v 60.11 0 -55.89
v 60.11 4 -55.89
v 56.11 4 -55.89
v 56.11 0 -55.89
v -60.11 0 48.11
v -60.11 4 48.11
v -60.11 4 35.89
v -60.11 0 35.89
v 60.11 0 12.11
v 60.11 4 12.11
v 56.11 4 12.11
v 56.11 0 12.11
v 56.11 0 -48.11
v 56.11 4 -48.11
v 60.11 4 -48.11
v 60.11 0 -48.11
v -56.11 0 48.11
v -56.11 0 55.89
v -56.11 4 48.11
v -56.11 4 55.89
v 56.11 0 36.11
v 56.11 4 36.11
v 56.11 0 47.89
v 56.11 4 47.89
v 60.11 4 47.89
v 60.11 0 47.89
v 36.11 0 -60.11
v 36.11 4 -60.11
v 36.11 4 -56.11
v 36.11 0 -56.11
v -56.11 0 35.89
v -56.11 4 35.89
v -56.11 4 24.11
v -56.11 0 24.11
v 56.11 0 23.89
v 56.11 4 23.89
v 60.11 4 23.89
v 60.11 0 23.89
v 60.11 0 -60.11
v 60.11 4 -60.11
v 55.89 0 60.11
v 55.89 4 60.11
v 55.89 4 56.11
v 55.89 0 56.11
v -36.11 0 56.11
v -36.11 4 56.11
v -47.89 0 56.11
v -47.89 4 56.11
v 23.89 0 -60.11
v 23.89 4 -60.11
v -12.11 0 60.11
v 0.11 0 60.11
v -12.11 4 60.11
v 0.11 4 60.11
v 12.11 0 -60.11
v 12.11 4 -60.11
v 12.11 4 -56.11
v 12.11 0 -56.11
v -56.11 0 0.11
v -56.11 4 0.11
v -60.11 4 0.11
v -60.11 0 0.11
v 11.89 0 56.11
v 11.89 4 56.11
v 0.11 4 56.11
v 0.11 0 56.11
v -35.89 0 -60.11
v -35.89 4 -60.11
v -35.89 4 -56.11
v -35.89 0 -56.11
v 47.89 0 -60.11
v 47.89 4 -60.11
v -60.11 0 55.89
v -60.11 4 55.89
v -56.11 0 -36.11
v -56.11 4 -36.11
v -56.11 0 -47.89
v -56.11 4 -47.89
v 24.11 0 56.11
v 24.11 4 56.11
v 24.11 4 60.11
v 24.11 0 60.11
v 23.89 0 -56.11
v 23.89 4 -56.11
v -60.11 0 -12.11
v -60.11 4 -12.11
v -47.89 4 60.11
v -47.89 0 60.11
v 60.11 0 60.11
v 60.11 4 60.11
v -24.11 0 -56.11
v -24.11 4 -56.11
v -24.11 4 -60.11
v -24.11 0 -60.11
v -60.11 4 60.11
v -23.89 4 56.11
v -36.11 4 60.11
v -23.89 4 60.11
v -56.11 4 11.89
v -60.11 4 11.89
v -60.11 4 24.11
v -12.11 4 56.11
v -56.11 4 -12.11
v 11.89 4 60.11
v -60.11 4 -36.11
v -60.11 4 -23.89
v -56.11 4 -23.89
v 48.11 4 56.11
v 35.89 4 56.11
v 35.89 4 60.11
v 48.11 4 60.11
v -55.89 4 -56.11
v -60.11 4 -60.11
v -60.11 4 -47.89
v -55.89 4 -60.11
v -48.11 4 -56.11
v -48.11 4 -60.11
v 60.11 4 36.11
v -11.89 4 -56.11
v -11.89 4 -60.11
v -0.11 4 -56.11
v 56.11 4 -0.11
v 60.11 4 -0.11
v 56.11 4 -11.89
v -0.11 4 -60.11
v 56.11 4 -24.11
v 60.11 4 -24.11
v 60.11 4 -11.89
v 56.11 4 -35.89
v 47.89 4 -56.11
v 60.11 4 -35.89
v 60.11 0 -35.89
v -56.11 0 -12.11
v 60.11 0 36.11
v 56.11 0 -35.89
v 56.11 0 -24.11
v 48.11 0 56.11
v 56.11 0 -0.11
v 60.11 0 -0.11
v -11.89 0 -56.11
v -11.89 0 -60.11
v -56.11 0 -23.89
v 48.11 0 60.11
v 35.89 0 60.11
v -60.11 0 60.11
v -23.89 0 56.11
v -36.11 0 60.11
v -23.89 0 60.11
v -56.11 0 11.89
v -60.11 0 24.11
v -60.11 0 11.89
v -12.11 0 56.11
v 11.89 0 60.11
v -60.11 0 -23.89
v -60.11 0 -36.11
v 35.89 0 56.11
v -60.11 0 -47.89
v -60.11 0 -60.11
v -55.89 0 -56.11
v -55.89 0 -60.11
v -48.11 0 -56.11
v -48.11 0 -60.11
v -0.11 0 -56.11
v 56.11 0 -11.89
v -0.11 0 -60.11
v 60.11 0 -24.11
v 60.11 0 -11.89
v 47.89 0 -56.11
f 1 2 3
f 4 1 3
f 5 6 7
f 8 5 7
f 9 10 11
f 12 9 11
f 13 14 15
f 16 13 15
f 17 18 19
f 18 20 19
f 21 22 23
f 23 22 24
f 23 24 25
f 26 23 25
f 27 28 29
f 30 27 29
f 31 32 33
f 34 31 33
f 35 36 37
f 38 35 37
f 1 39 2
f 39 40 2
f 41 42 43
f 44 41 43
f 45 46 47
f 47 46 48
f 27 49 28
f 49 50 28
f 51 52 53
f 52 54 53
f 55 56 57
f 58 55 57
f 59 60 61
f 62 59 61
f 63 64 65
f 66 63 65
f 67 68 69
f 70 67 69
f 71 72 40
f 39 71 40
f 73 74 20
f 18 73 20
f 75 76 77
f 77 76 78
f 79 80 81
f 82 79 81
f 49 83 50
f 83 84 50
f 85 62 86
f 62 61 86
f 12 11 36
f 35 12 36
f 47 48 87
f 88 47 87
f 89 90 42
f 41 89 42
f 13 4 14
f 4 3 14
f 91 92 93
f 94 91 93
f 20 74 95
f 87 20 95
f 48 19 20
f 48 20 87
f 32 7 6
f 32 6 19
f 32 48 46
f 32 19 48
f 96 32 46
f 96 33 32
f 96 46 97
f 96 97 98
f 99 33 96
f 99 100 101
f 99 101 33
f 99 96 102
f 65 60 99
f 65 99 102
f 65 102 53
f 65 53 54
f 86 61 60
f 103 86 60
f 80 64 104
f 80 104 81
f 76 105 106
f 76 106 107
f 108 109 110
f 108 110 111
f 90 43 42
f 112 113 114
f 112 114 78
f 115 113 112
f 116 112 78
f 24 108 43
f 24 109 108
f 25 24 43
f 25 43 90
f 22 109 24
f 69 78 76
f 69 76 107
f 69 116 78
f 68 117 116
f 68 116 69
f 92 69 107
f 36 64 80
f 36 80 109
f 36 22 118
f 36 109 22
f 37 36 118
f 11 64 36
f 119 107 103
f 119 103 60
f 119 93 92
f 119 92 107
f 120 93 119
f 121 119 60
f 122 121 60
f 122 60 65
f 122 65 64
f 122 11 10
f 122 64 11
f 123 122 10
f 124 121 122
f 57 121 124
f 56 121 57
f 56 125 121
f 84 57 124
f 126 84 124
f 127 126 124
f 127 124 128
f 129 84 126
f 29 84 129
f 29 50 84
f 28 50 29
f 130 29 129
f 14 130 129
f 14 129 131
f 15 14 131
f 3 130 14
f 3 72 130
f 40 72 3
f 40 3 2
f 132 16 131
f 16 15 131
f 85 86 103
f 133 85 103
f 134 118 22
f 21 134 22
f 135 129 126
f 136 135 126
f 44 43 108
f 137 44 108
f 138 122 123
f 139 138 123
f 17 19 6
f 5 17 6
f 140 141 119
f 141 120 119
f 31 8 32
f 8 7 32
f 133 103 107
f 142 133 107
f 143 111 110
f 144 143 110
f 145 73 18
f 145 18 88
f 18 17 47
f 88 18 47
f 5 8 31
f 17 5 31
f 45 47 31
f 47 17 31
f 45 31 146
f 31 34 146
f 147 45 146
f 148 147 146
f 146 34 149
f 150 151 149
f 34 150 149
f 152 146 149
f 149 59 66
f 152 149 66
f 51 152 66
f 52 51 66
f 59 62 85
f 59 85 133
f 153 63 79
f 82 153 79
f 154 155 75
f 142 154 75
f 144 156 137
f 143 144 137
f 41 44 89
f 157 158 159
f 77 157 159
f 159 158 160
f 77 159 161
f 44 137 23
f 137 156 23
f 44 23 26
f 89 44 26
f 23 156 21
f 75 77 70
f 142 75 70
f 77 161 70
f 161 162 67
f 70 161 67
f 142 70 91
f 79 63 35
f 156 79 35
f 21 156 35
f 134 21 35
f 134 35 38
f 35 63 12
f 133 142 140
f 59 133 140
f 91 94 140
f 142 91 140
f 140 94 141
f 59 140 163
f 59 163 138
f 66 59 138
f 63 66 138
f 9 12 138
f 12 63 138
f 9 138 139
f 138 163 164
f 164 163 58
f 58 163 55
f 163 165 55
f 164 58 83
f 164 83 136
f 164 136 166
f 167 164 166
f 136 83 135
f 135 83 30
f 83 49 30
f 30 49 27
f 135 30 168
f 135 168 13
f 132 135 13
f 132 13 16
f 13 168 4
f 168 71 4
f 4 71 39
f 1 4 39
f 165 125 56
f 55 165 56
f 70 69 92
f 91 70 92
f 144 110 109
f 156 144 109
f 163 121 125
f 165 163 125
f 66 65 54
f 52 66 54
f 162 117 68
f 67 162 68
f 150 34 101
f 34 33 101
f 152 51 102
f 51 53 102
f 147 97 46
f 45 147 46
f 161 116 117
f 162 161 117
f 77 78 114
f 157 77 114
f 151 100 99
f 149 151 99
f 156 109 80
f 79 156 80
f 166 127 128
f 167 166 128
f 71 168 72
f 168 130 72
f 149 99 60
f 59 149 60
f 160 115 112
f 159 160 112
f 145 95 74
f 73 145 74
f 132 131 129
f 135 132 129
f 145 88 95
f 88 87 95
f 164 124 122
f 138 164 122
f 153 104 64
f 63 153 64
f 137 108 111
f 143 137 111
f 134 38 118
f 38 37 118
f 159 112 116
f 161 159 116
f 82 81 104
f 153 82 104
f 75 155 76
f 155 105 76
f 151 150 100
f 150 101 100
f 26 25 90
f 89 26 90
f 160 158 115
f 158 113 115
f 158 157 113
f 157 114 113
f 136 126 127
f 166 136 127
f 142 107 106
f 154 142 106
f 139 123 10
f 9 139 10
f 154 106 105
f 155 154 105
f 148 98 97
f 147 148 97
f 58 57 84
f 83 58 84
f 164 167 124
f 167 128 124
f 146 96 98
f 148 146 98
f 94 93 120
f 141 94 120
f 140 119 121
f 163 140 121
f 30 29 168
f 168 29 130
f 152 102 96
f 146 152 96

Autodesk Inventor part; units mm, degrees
ref_plane "YZ Plane" through (0, 0, 0) normal (1, 0, 0) x (0, 1, 0)
ref_plane "XZ Plane" through (0, 0, 0) normal (0, 1, 0) x (-1, 0, 0)
ref_plane "XY Plane" through (0, 0, 0) normal (0, 0, 1) x (1, 0, 0)
sketch "Sketch1" plane through (0, 0, 0) normal (0, 1, 0) x (-1, 0, 0)
  line L0 (60, 60) -> (-60, 60)
  line L1 (-60, 60) -> (-60, -60)
  line L2 (-60, -60) -> (60, -60)
  line L3 (60, -60) -> (60, 60)
  point P0 (0, 0)
  dimension "d2" = 120
  dimension "d3" = 120
  dimension "d4" = 60
  dimension "d5" = 60
extrude "Extrusion1" add sketch "Sketch1" along normal blind 4
sketch "Sketch2" plane through (-60, 0, -60) normal (-1, 0, 0) x (0, 0, 1)
  line L0 (12, 0) -> (24, 0)
  line L1 (24, 0) -> (24, 4)
  line L2 (24, 4) -> (12, 4)
  line L3 (12, 4) -> (12, 0)
  line L4 (0, 4) -> (120, 4) projected
  line L5 (0, 0) -> (0, 4) projected
  point P0 (60, 0)
  dimension "d8" = 12
  dimension "d9" = 4
  dimension "d10" = 0
  dimension "d11" = 12
extrude "Extrusion2" cut sketch "Sketch2" against normal blind 4
pattern_linear "Rectangular Pattern1" count 5 spacing 24 along (0, 0, 1) of "Extrusion2"
sketch "Sketch3" plane through (-56, 0, 60) normal (-1, 0, 0) x (0, 0, 1)
  line L0 (0, 0) -> (-4, 0)
  line L1 (-4, 0) -> (-4, 4)
  line L2 (-4, 4) -> (0, 4)
  line L3 (0, 4) -> (0, 0)
  line L4 (0, 0) -> (0, 4) projected
  line L5 (0, 4) -> (-120, 4) projected
  point P0 (-60, 0)
  dimension "d23" = 4
  dimension "d24" = 4
  dimension "d25" = 0
  dimension "d26" = 0
extrude "Extrusion3" add sketch "Sketch3" along normal blind 4
pattern_circular "Circular Pattern3" count 4 over 360 about axis through (0, -10, 0) along (0, 1, 0) of "Extrusion3", "Extrusion2", "Rectangular Pattern1"
sketch "Sketch4" plane through (0, 4, 0) normal (0, 1, 0) x (1, 0, 0)
  line L0 (-48, 56) -> (-56, 56) projected
  line L1 (-56, 56) -> (-56, 60) projected
  line L2 (-60, 60) -> (-56, 60) projected
  line L3 (-60, 60) -> (-60, 48) projected
  line L4 (-60, 48) -> (-56, 48) projected
  line L5 (-56, 48) -> (-56, 36) projected
  line L6 (-56, 36) -> (-60, 36) projected
  line L7 (-60, 36) -> (-60, 24) projected
  line L8 (-60, 24) -> (-56, 24) projected
  line L9 (-56, 24) -> (-56, 12) projected
  line L10 (-56, 12) -> (-60, 12) projected
  line L11 (-60, 12) -> (-60, 0) projected
  line L12 (-60, 0) -> (-56, 0) projected
  line L13 (-56, 0) -> (-56, -12) projected
  line L14 (-56, -12) -> (-60, -12) projected
  line L15 (-60, -12) -> (-60, -24) projected
  line L16 (-60, -24) -> (-56, -24) projected
  line L17 (-56, -24) -> (-56, -36) projected
  line L18 (-56, -36) -> (-60, -36) projected
  line L19 (-60, -36) -> (-60, -48) projected
  line L20 (-60, -48) -> (-56, -48) projected
  line L21 (-56, -48) -> (-56, -56) projected
  line L22 (-56, -56) -> (-60, -56) projected
  line L23 (-60, -60) -> (-60, -56) projected
  line L24 (-60, -60) -> (-48, -60) projected
  line L25 (-48, -60) -> (-48, -56) projected
  line L26 (-48, -56) -> (-36, -56) projected
  line L27 (-36, -56) -> (-36, -60) projected
  line L28 (-36, -60) -> (-24, -60) projected
  line L29 (-24, -60) -> (-24, -56) projected
  line L30 (-24, -56) -> (-12, -56) projected
  line L31 (-12, -56) -> (-12, -60) projected
  line L32 (-12, -60) -> (0, -60) projected
  line L33 (0, -60) -> (0, -56) projected
  line L34 (0, -56) -> (12, -56) projected
  line L35 (12, -56) -> (12, -60) projected
  line L36 (12, -60) -> (24, -60) projected
  line L37 (24, -60) -> (24, -56) projected
  line L38 (24, -56) -> (36, -56) projected
  line L39 (36, -56) -> (36, -60) projected
  line L40 (36, -60) -> (48, -60) projected
  line L41 (48, -60) -> (48, -56) projected
  line L42 (48, -56) -> (56, -56) projected
  line L43 (56, -56) -> (56, -60) projected
  line L44 (60, -60) -> (56, -60) projected
  line L45 (60, -60) -> (60, -48) projected
  line L46 (60, -48) -> (56, -48) projected
  line L47 (56, -48) -> (56, -36) projected
  line L48 (56, -36) -> (60, -36) projected
  line L49 (60, -36) -> (60, -24) projected
  line L50 (60, -24) -> (56, -24) projected
  line L51 (56, -24) -> (56, -12) projected
  line L52 (56, -12) -> (60, -12) projected
  line L53 (60, -12) -> (60, 0) projected
  line L54 (60, 0) -> (56, 0) projected
  line L55 (56, 0) -> (56, 12) projected
  line L56 (56, 12) -> (60, 12) projected
  line L57 (60, 12) -> (60, 24) projected
  line L58 (60, 24) -> (56, 24) projected
  line L59 (56, 24) -> (56, 36) projected
  line L60 (56, 36) -> (60, 36) projected
  line L61 (60, 36) -> (60, 48) projected
  line L62 (60, 48) -> (56, 48) projected
  line L63 (56, 48) -> (56, 56) projected
  line L64 (56, 56) -> (60, 56) projected
  line L65 (60, 60) -> (60, 56) projected
  line L66 (60, 60) -> (48, 60) projected
  line L67 (48, 60) -> (48, 56) projected
  line L68 (48, 56) -> (36, 56) projected
  line L69 (36, 56) -> (36, 60) projected
  line L70 (36, 60) -> (24, 60) projected
  line L71 (24, 60) -> (24, 56) projected
  line L72 (24, 56) -> (12, 56) projected
  line L73 (12, 56) -> (12, 60) projected
  line L74 (12, 60) -> (0, 60) projected
  line L75 (0, 60) -> (0, 56) projected
  line L76 (0, 56) -> (-12, 56) projected
  line L77 (-12, 56) -> (-12, 60) projected
  line L78 (-12, 60) -> (-24, 60) projected
  line L79 (-24, 60) -> (-24, 56) projected
  line L80 (-24, 56) -> (-36, 56) projected
  line L81 (-36, 56) -> (-36, 60) projected
  line L82 (-36, 60) -> (-48, 60) projected
  line L83 (-48, 60) -> (-48, 56) projected
  line L84 (-48.11, 60.11) -> (-35.89, 60.11)
  line L85 (-35.89, 60.11) -> (-35.89, 56.11)
  line L86 (-35.89, 56.11) -> (-24.11, 56.11)
  line L87 (-24.11, 56.11) -> (-24.11, 60.11)
  line L88 (-24.11, 60.11) -> (-11.89, 60.11)
  line L89 (-11.89, 60.11) -> (-11.89, 56.11)
  line L90 (-11.89, 56.11) -> (-0.11, 56.11)
  line L91 (-0.11, 56.11) -> (-0.11, 60.11)
  line L92 (-0.11, 60.11) -> (12.11, 60.11)
  line L93 (12.11, 60.11) -> (12.11, 56.11)
  line L94 (12.11, 56.11) -> (23.89, 56.11)
  line L95 (23.89, 56.11) -> (23.89, 60.11)
  line L96 (23.89, 60.11) -> (36.11, 60.11)
  line L97 (36.11, 60.11) -> (36.11, 56.11)
  line L98 (36.11, 56.11) -> (47.89, 56.11)
  line L99 (47.89, 56.11) -> (47.89, 60.11)
  line L100 (47.89, 60.11) -> (60.11, 60.11)
  line L101 (60.11, 60.11) -> (60.11, 55.89)
  line L102 (60.11, 55.89) -> (56.11, 55.89)
  line L103 (56.11, 55.89) -> (56.11, 48.11)
  line L104 (56.11, 48.11) -> (60.11, 48.11)
  line L105 (60.11, 48.11) -> (60.11, 35.89)
  line L106 (60.11, 35.89) -> (56.11, 35.89)
  line L107 (56.11, 35.89) -> (56.11, 24.11)
  line L108 (56.11, 24.11) -> (60.11, 24.11)
  line L109 (60.11, 24.11) -> (60.11, 11.89)
  line L110 (60.11, 11.89) -> (56.11, 11.89)
  line L111 (56.11, 11.89) -> (56.11, 0.11)
  line L112 (56.11, 0.11) -> (60.11, 0.11)
  line L113 (60.11, 0.11) -> (60.11, -12.11)
  line L114 (60.11, -12.11) -> (56.11, -12.11)
  line L115 (56.11, -12.11) -> (56.11, -23.89)
  line L116 (56.11, -23.89) -> (60.11, -23.89)
  line L117 (60.11, -23.89) -> (60.11, -36.11)
  line L118 (60.11, -36.11) -> (56.11, -36.11)
  line L119 (56.11, -36.11) -> (56.11, -47.89)
  line L120 (56.11, -47.89) -> (60.11, -47.89)
  line L121 (60.11, -47.89) -> (60.11, -60.11)
  line L122 (60.11, -60.11) -> (55.89, -60.11)
  line L123 (55.89, -60.11) -> (55.89, -56.11)
  line L124 (55.89, -56.11) -> (48.11, -56.11)
  line L125 (48.11, -56.11) -> (48.11, -60.11)
  line L126 (48.11, -60.11) -> (35.89, -60.11)
  line L127 (35.89, -60.11) -> (35.89, -56.11)
  line L128 (35.89, -56.11) -> (24.11, -56.11)
  line L129 (24.11, -56.11) -> (24.11, -60.11)
  line L130 (24.11, -60.11) -> (11.89, -60.11)
  line L131 (11.89, -60.11) -> (11.89, -56.11)
  line L132 (11.89, -56.11) -> (0.11, -56.11)
  line L133 (0.11, -56.11) -> (0.11, -60.11)
  line L134 (0.11, -60.11) -> (-12.11, -60.11)
  line L135 (-12.11, -60.11) -> (-12.11, -56.11)
  line L136 (-12.11, -56.11) -> (-23.89, -56.11)
  line L137 (-23.89, -56.11) -> (-23.89, -60.11)
  line L138 (-23.89, -60.11) -> (-36.11, -60.11)
  line L139 (-36.11, -60.11) -> (-36.11, -56.11)
  line L140 (-36.11, -56.11) -> (-47.89, -56.11)
  line L141 (-47.89, -56.11) -> (-47.89, -60.11)
  line L142 (-47.89, -60.11) -> (-60.11, -60.11)
  line L143 (-60.11, -60.11) -> (-60.11, -55.89)
  line L144 (-60.11, -55.89) -> (-56.11, -55.89)
  line L145 (-56.11, -55.89) -> (-56.11, -48.11)
  line L146 (-56.11, -48.11) -> (-60.11, -48.11)
  line L147 (-60.11, -48.11) -> (-60.11, -35.89)
  line L148 (-60.11, -35.89) -> (-56.11, -35.89)
  line L149 (-56.11, -35.89) -> (-56.11, -24.11)
  line L150 (-56.11, -24.11) -> (-60.11, -24.11)
  line L151 (-60.11, -24.11) -> (-60.11, -11.89)
  line L152 (-60.11, -11.89) -> (-56.11, -11.89)
  line L153 (-56.11, -11.89) -> (-56.11, -0.11)
  line L154 (-56.11, -0.11) -> (-60.11, -0.11)
  line L155 (-60.11, -0.11) -> (-60.11, 12.11)
  line L156 (-60.11, 12.11) -> (-56.11, 12.11)
  line L157 (-56.11, 12.11) -> (-56.11, 23.89)
  line L158 (-56.11, 23.89) -> (-60.11, 23.89)
  line L159 (-60.11, 23.89) -> (-60.11, 36.11)
  line L160 (-60.11, 36.11) -> (-56.11, 36.11)
  line L161 (-56.11, 36.11) -> (-56.11, 47.89)
  line L162 (-56.11, 47.89) -> (-60.11, 47.89)
  line L163 (-60.11, 47.89) -> (-60.11, 60.11)
  line L164 (-60.11, 60.11) -> (-55.89, 60.11)
  line L165 (-55.89, 60.11) -> (-55.89, 56.11)
  line L166 (-55.89, 56.11) -> (-48.11, 56.11)
  line L167 (-48.11, 56.11) -> (-48.11, 60.11)
  point P0 (0, 0)
  dimension "d32" = 0.11
extrude "Extrusion4" add sketch "Sketch4" against normal blind 4 contours L83 L82 L81 L80 L79 L78 L77 L76 L75 L74 L73 L72 L71 L70 L69 L68 L67 L66 L65 L64 L63 L62 L61 L60 L59 L58 L57 L56 L55 L54 L53 L52 L51 L50 L49 L48 L47 L46 L45 L44 L43 L42 L41 L40 L39 L38 L37 L36 L35 L34 L33 L32 L31 L30 L29 L28 L27 L26 L25 L24 L23 L22 L21 L20 L19 L18 L17 L16 L15 L14 L13 L12 L11 L10 L9 L8 L7 L6 L5 L4 L3 L2 L1 L0 | L84 L85 L86 L87 L88 L89 L90 L91 L92 L93 L94 L95 L96 L97 L98 L99 L100 L101 L102 L103 L104 L105 L106 L107 L108 L109 L110 L111 L112 L113 L114 L115 L116 L117 L118 L119 L120 L121 L122 L123 L124 L125 L126 L127 L128 L129 L130 L131 L132 L133 L134 L135 L136 L137 L138 L139 L140 L141 L142 L143 L144 L145 L146 L147 L148 L149 L150 L151 L152 L153 L154 L155 L156 L157 L158 L159 L160 L161 L162 L163 L164 L165 L166 L167
sketch "Sketch5" plane through (0, 0, 0) normal (0, -1, 0) x (1, 0, 0)
  line L0 (-55.89, -56.11) -> (-48.11, -56.11) projected
  line L1 (-48.11, -56.11) -> (-48.11, -60.11) projected
  line L2 (-48.11, -60.11) -> (-35.89, -60.11) projected
  line L3 (-35.89, -60.11) -> (-35.89, -56.11) projected
  line L4 (-35.89, -56.11) -> (-24.11, -56.11) projected
  line L5 (-24.11, -56.11) -> (-24.11, -60.11) projected
  line L6 (-24.11, -60.11) -> (-11.89, -60.11) projected
  line L7 (-11.89, -60.11) -> (-11.89, -56.11) projected
  line L8 (-11.89, -56.11) -> (-0.11, -56.11) projected
  line L9 (-0.11, -56.11) -> (-0.11, -60.11) projected
  line L10 (-0.11, -60.11) -> (12.11, -60.11) projected
  line L11 (12.11, -60.11) -> (12.11, -56.11) projected
  line L12 (12.11, -56.11) -> (23.89, -56.11) projected
  line L13 (23.89, -56.11) -> (23.89, -60.11) projected
  line L14 (23.89, -60.11) -> (36.11, -60.11) projected
  line L15 (36.11, -60.11) -> (36.11, -56.11) projected
  line L16 (36.11, -56.11) -> (47.89, -56.11) projected
  line L17 (47.89, -56.11) -> (47.89, -60.11) projected
  line L18 (47.89, -60.11) -> (60.11, -60.11) projected
  line L19 (60.11, -60.11) -> (60.11, -55.89) projected
  line L20 (60.11, -55.89) -> (56.11, -55.89) projected
  line L21 (56.11, -55.89) -> (56.11, -48.11) projected
  line L22 (56.11, -48.11) -> (60.11, -48.11) projected
  line L23 (60.11, -48.11) -> (60.11, -35.89) projected
  line L24 (60.11, -35.89) -> (56.11, -35.89) projected
  line L25 (56.11, -35.89) -> (56.11, -24.11) projected
  line L26 (56.11, -24.11) -> (60.11, -24.11) projected
  line L27 (60.11, -24.11) -> (60.11, -11.89) projected
  line L28 (60.11, -11.89) -> (56.11, -11.89) projected
  line L29 (56.11, -11.89) -> (56.11, -0.11) projected
  line L30 (56.11, -0.11) -> (60.11, -0.11) projected
  line L31 (60.11, -0.11) -> (60.11, 12.11) projected
  line L32 (60.11, 12.11) -> (56.11, 12.11) projected
  line L33 (56.11, 12.11) -> (56.11, 23.89) projected
  line L34 (56.11, 23.89) -> (60.11, 23.89) projected
  line L35 (60.11, 23.89) -> (60.11, 36.11) projected
  line L36 (60.11, 36.11) -> (56.11, 36.11) projected
  line L37 (56.11, 36.11) -> (56.11, 47.89) projected
  line L38 (56.11, 47.89) -> (60.11, 47.89) projected
  line L39 (60.11, 47.89) -> (60.11, 60.11) projected
  line L40 (60.11, 60.11) -> (55.89, 60.11) projected
  line L41 (55.89, 60.11) -> (55.89, 56.11) projected
  line L42 (55.89, 56.11) -> (48.11, 56.11) projected
  line L43 (48.11, 56.11) -> (48.11, 60.11) projected
  line L44 (48.11, 60.11) -> (35.89, 60.11) projected
  line L45 (35.89, 60.11) -> (35.89, 56.11) projected
  line L46 (35.89, 56.11) -> (24.11, 56.11) projected
  line L47 (24.11, 56.11) -> (24.11, 60.11) projected
  line L48 (24.11, 60.11) -> (11.89, 60.11) projected
  line L49 (11.89, 60.11) -> (11.89, 56.11) projected
  line L50 (11.89, 56.11) -> (0.11, 56.11) projected
  line L51 (0.11, 56.11) -> (0.11, 60.11) projected
  line L52 (0.11, 60.11) -> (-12.11, 60.11) projected
  line L53 (-12.11, 60.11) -> (-12.11, 56.11) projected
  line L54 (-12.11, 56.11) -> (-23.89, 56.11) projected
  line L55 (-23.89, 56.11) -> (-23.89, 60.11) projected
  line L56 (-23.89, 60.11) -> (-36.11, 60.11) projected
  line L57 (-36.11, 60.11) -> (-36.11, 56.11) projected
  line L58 (-36.11, 56.11) -> (-47.89, 56.11) projected
  line L59 (-47.89, 56.11) -> (-47.89, 60.11) projected
  line L60 (-47.89, 60.11) -> (-60.11, 60.11) projected
  line L61 (-60.11, 60.11) -> (-60.11, 55.89) projected
  line L62 (-60.11, 55.89) -> (-56.11, 55.89) projected
  line L63 (-56.11, 55.89) -> (-56.11, 48.11) projected
  line L64 (-56.11, 48.11) -> (-60.11, 48.11) projected
  line L65 (-60.11, 48.11) -> (-60.11, 35.89) projected
  line L66 (-60.11, 35.89) -> (-56.11, 35.89) projected
  line L67 (-56.11, 35.89) -> (-56.11, 24.11) projected
  line L68 (-56.11, 24.11) -> (-60.11, 24.11) projected
  line L69 (-60.11, 24.11) -> (-60.11, 11.89) projected
  line L70 (-60.11, 11.89) -> (-56.11, 11.89) projected
  line L71 (-56.11, 11.89) -> (-56.11, 0.11) projected
  line L72 (-56.11, 0.11) -> (-60.11, 0.11) projected
  line L73 (-60.11, 0.11) -> (-60.11, -12.11) projected
  line L74 (-60.11, -12.11) -> (-56.11, -12.11) projected
  line L75 (-56.11, -12.11) -> (-56.11, -23.89) projected
  line L76 (-56.11, -23.89) -> (-60.11, -23.89) projected
  line L77 (-60.11, -23.89) -> (-60.11, -36.11) projected
  line L78 (-60.11, -36.11) -> (-56.11, -36.11) projected
  line L79 (-56.11, -36.11) -> (-56.11, -47.89) projected
  line L80 (-56.11, -47.89) -> (-60.11, -47.89) projected
  line L81 (-60.11, -47.89) -> (-60.11, -60.11) projected
  line L82 (-60.11, -60.11) -> (-55.89, -60.11) projected
  line L83 (-55.89, -60.11) -> (-55.89, -56.11) projected
  point P0 (0, 0)
equation "\"d2\" = width"
equation "\"d3\" = height"
equation "\"d4\" = 0.5 * width"
equation "\"d5\" = 0.5 * height"
equation "\"d8\" = finger"
equation "\"d9\" = thickness"
equation "\"d11\" = finger"
equation "\"d19\" = 2 * finger"
equation "\"d23\" = thickness"
equation "\"d24\" = 0.333333 * finger"
equation "\"d27\" = thickness"
equation "\"d32\" = 0.5 * kerf"
equation "\"d33\" = thickness"
equation "\"width\" = 120"
equation "\"height\" = 120"
equation "\"finger\" = 12"
equation "\"thickness\" = 4"
equation "\"kerf\" = 0.22"
properties part number "Lukt_botn"
